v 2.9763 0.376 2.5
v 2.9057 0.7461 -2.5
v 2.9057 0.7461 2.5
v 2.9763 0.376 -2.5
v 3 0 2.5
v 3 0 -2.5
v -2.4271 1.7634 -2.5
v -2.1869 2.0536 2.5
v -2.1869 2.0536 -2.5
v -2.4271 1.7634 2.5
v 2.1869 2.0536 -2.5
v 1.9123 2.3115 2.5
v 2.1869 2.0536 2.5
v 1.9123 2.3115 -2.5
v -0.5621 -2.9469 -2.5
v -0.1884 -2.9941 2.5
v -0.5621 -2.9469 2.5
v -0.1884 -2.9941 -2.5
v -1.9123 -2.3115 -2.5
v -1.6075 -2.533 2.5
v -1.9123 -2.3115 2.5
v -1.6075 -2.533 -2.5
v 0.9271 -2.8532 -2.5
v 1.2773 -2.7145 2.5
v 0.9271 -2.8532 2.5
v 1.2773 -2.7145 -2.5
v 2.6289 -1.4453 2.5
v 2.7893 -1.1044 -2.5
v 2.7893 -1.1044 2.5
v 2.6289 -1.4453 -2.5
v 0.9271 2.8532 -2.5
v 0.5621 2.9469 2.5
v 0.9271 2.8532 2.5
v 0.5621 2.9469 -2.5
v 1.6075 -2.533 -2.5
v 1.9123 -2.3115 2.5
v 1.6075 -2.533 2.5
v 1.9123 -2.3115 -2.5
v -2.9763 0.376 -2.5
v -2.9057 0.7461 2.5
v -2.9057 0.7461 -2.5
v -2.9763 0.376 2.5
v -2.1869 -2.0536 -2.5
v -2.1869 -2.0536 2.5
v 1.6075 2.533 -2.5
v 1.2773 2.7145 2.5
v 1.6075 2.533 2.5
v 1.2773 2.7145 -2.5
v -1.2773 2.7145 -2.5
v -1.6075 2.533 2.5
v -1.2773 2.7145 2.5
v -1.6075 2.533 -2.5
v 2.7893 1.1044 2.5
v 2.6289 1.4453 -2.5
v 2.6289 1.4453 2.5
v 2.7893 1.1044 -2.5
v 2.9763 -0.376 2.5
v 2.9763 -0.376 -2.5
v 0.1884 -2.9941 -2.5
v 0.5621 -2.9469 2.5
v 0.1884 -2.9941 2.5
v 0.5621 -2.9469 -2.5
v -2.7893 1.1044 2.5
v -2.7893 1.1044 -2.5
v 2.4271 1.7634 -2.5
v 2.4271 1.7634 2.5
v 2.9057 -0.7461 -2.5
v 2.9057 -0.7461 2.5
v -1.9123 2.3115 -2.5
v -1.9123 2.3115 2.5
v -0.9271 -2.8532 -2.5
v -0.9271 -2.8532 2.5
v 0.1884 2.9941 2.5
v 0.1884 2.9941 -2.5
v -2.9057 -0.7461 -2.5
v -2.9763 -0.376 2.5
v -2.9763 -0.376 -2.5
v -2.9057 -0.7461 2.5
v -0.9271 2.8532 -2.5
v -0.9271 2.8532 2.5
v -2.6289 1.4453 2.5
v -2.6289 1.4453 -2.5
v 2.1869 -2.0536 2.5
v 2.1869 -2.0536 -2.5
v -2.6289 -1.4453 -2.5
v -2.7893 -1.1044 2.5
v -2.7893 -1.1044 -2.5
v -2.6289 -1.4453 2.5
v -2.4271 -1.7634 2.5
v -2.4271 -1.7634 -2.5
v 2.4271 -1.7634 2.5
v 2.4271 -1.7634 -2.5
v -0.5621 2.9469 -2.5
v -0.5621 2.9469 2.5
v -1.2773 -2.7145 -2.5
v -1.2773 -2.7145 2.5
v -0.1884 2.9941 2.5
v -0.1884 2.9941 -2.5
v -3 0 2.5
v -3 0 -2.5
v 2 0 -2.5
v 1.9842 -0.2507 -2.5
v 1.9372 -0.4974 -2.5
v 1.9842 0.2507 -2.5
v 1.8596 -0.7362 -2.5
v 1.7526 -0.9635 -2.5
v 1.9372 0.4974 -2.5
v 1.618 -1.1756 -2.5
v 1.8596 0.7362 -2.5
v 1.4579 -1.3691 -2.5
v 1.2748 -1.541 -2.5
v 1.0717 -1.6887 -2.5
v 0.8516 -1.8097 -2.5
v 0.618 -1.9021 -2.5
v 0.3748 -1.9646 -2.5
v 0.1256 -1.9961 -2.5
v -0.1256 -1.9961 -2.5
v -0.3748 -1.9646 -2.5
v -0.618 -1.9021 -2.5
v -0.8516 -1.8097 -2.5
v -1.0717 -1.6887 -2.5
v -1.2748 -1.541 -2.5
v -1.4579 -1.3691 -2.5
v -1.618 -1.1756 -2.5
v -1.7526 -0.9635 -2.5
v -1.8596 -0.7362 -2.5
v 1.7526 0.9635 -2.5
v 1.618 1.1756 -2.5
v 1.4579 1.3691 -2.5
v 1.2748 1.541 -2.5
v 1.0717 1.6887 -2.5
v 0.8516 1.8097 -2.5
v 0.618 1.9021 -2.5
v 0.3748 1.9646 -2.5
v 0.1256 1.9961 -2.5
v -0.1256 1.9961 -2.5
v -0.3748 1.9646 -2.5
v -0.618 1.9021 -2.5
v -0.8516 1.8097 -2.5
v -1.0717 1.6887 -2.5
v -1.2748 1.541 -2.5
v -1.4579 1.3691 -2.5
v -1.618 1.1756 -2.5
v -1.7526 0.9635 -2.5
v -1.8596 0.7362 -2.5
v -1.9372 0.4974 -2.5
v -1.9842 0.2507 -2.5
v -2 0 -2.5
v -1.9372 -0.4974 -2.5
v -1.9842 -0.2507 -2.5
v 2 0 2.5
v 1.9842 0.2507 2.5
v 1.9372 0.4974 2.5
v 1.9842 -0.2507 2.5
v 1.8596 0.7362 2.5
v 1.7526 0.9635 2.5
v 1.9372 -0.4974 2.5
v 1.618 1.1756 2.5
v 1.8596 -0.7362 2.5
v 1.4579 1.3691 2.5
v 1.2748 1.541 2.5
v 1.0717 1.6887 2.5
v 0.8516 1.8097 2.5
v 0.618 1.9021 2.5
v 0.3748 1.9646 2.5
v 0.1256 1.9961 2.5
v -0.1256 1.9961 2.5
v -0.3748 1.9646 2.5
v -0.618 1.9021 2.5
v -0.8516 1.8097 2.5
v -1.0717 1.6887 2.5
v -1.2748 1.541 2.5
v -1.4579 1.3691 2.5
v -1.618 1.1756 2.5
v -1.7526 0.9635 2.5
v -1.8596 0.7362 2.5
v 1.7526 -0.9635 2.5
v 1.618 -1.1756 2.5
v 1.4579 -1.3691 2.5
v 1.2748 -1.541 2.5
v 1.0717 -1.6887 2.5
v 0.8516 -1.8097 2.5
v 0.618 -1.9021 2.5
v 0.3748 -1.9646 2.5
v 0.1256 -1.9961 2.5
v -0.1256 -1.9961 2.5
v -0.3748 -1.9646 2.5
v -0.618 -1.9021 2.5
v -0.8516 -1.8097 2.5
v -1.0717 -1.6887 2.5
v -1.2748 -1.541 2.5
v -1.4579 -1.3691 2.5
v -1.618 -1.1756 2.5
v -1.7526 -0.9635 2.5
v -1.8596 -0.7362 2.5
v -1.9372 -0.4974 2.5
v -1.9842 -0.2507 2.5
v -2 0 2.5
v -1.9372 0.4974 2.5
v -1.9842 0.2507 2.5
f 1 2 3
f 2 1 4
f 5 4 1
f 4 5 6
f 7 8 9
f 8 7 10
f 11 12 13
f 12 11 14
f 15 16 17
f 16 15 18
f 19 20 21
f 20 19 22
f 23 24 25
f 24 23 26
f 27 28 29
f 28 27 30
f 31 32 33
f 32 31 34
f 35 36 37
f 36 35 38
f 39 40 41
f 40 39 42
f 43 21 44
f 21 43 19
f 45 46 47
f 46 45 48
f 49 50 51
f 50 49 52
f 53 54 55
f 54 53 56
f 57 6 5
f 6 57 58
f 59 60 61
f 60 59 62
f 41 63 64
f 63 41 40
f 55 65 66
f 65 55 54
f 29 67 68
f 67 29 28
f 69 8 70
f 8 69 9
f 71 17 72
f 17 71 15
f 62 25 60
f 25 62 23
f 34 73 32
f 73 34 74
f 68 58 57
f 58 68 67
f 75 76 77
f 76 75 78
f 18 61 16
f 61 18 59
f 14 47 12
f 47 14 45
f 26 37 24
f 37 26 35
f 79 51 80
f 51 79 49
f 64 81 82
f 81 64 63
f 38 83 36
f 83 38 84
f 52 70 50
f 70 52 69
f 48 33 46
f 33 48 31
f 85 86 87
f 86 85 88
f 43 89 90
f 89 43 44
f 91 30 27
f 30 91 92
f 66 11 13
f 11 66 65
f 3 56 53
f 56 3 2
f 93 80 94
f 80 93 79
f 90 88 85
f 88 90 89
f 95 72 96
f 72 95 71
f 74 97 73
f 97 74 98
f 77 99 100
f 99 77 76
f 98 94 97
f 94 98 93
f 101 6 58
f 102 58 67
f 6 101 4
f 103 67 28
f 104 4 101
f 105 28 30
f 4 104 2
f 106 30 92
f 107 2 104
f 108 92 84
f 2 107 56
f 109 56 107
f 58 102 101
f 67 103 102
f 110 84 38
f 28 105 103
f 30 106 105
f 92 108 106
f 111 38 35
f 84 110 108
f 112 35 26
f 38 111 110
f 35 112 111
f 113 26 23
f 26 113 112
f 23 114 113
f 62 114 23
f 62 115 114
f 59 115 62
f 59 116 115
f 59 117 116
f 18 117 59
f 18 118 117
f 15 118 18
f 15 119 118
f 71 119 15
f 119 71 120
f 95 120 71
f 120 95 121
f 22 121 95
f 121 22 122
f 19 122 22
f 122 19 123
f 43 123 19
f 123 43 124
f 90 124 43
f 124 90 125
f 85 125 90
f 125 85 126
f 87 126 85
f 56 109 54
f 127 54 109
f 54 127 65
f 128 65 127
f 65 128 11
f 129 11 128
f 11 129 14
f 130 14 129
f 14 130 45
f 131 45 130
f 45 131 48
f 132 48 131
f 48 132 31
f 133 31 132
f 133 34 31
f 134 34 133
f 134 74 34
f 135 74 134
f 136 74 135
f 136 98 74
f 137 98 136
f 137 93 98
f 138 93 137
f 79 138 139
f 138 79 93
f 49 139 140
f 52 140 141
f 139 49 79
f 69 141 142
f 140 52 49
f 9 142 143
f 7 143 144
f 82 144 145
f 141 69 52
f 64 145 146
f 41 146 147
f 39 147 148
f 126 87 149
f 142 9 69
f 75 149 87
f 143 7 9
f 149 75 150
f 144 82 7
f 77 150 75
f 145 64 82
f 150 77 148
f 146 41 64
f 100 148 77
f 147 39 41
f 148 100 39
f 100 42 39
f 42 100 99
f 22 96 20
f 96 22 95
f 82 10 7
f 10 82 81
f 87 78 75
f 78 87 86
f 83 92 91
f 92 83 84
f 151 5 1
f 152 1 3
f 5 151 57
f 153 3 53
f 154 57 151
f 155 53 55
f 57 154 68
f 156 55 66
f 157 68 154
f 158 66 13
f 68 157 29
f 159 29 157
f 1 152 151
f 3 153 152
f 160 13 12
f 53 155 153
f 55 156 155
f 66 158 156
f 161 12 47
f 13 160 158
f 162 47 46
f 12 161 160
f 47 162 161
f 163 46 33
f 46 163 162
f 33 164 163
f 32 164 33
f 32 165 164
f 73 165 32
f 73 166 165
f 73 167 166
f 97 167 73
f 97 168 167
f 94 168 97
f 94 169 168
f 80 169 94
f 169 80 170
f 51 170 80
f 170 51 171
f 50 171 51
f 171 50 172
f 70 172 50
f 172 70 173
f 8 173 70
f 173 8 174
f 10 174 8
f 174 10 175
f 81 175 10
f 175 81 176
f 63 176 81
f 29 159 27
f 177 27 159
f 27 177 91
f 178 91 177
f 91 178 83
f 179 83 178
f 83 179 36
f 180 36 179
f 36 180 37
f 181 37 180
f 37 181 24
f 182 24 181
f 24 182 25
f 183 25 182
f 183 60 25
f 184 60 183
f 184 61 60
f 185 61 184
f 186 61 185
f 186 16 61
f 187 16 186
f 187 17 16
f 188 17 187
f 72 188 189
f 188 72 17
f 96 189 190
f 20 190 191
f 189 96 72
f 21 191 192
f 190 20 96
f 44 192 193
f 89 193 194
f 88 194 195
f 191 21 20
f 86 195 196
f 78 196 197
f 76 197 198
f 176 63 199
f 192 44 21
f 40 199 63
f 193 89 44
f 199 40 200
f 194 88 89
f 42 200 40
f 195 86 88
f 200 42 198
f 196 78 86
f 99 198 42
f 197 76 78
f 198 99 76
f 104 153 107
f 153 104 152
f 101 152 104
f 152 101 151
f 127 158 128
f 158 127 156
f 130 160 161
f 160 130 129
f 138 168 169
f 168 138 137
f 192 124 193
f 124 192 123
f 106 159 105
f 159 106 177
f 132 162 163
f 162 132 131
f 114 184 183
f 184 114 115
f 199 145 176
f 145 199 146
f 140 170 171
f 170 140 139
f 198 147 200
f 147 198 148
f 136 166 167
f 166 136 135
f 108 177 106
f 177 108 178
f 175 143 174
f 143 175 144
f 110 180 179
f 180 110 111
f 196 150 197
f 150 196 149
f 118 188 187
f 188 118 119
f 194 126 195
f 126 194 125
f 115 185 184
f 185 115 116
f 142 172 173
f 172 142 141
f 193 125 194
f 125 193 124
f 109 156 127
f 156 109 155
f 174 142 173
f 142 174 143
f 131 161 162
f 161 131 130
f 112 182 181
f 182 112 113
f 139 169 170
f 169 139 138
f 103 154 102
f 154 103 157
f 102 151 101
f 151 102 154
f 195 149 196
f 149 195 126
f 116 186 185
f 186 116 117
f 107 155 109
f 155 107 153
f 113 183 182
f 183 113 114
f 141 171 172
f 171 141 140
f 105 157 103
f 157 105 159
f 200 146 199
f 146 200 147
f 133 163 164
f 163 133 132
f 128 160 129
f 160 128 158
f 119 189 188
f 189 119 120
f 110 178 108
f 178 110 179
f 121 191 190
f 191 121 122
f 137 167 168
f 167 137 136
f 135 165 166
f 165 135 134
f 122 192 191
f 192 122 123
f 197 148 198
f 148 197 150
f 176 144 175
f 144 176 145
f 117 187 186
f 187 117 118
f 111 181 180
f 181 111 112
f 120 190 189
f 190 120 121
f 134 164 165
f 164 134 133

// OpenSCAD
$fn = 50;


difference() {
	union() {
		translate(v = [0, 0, -2.5000000000]) {
			cylinder(h = 5, r = 3.0000000000);
		}
	}
	union() {
		translate(v = [0, 0, -100.0000000000]) {
			cylinder(h = 200, r = 2.0000000000);
		}
	}
}
